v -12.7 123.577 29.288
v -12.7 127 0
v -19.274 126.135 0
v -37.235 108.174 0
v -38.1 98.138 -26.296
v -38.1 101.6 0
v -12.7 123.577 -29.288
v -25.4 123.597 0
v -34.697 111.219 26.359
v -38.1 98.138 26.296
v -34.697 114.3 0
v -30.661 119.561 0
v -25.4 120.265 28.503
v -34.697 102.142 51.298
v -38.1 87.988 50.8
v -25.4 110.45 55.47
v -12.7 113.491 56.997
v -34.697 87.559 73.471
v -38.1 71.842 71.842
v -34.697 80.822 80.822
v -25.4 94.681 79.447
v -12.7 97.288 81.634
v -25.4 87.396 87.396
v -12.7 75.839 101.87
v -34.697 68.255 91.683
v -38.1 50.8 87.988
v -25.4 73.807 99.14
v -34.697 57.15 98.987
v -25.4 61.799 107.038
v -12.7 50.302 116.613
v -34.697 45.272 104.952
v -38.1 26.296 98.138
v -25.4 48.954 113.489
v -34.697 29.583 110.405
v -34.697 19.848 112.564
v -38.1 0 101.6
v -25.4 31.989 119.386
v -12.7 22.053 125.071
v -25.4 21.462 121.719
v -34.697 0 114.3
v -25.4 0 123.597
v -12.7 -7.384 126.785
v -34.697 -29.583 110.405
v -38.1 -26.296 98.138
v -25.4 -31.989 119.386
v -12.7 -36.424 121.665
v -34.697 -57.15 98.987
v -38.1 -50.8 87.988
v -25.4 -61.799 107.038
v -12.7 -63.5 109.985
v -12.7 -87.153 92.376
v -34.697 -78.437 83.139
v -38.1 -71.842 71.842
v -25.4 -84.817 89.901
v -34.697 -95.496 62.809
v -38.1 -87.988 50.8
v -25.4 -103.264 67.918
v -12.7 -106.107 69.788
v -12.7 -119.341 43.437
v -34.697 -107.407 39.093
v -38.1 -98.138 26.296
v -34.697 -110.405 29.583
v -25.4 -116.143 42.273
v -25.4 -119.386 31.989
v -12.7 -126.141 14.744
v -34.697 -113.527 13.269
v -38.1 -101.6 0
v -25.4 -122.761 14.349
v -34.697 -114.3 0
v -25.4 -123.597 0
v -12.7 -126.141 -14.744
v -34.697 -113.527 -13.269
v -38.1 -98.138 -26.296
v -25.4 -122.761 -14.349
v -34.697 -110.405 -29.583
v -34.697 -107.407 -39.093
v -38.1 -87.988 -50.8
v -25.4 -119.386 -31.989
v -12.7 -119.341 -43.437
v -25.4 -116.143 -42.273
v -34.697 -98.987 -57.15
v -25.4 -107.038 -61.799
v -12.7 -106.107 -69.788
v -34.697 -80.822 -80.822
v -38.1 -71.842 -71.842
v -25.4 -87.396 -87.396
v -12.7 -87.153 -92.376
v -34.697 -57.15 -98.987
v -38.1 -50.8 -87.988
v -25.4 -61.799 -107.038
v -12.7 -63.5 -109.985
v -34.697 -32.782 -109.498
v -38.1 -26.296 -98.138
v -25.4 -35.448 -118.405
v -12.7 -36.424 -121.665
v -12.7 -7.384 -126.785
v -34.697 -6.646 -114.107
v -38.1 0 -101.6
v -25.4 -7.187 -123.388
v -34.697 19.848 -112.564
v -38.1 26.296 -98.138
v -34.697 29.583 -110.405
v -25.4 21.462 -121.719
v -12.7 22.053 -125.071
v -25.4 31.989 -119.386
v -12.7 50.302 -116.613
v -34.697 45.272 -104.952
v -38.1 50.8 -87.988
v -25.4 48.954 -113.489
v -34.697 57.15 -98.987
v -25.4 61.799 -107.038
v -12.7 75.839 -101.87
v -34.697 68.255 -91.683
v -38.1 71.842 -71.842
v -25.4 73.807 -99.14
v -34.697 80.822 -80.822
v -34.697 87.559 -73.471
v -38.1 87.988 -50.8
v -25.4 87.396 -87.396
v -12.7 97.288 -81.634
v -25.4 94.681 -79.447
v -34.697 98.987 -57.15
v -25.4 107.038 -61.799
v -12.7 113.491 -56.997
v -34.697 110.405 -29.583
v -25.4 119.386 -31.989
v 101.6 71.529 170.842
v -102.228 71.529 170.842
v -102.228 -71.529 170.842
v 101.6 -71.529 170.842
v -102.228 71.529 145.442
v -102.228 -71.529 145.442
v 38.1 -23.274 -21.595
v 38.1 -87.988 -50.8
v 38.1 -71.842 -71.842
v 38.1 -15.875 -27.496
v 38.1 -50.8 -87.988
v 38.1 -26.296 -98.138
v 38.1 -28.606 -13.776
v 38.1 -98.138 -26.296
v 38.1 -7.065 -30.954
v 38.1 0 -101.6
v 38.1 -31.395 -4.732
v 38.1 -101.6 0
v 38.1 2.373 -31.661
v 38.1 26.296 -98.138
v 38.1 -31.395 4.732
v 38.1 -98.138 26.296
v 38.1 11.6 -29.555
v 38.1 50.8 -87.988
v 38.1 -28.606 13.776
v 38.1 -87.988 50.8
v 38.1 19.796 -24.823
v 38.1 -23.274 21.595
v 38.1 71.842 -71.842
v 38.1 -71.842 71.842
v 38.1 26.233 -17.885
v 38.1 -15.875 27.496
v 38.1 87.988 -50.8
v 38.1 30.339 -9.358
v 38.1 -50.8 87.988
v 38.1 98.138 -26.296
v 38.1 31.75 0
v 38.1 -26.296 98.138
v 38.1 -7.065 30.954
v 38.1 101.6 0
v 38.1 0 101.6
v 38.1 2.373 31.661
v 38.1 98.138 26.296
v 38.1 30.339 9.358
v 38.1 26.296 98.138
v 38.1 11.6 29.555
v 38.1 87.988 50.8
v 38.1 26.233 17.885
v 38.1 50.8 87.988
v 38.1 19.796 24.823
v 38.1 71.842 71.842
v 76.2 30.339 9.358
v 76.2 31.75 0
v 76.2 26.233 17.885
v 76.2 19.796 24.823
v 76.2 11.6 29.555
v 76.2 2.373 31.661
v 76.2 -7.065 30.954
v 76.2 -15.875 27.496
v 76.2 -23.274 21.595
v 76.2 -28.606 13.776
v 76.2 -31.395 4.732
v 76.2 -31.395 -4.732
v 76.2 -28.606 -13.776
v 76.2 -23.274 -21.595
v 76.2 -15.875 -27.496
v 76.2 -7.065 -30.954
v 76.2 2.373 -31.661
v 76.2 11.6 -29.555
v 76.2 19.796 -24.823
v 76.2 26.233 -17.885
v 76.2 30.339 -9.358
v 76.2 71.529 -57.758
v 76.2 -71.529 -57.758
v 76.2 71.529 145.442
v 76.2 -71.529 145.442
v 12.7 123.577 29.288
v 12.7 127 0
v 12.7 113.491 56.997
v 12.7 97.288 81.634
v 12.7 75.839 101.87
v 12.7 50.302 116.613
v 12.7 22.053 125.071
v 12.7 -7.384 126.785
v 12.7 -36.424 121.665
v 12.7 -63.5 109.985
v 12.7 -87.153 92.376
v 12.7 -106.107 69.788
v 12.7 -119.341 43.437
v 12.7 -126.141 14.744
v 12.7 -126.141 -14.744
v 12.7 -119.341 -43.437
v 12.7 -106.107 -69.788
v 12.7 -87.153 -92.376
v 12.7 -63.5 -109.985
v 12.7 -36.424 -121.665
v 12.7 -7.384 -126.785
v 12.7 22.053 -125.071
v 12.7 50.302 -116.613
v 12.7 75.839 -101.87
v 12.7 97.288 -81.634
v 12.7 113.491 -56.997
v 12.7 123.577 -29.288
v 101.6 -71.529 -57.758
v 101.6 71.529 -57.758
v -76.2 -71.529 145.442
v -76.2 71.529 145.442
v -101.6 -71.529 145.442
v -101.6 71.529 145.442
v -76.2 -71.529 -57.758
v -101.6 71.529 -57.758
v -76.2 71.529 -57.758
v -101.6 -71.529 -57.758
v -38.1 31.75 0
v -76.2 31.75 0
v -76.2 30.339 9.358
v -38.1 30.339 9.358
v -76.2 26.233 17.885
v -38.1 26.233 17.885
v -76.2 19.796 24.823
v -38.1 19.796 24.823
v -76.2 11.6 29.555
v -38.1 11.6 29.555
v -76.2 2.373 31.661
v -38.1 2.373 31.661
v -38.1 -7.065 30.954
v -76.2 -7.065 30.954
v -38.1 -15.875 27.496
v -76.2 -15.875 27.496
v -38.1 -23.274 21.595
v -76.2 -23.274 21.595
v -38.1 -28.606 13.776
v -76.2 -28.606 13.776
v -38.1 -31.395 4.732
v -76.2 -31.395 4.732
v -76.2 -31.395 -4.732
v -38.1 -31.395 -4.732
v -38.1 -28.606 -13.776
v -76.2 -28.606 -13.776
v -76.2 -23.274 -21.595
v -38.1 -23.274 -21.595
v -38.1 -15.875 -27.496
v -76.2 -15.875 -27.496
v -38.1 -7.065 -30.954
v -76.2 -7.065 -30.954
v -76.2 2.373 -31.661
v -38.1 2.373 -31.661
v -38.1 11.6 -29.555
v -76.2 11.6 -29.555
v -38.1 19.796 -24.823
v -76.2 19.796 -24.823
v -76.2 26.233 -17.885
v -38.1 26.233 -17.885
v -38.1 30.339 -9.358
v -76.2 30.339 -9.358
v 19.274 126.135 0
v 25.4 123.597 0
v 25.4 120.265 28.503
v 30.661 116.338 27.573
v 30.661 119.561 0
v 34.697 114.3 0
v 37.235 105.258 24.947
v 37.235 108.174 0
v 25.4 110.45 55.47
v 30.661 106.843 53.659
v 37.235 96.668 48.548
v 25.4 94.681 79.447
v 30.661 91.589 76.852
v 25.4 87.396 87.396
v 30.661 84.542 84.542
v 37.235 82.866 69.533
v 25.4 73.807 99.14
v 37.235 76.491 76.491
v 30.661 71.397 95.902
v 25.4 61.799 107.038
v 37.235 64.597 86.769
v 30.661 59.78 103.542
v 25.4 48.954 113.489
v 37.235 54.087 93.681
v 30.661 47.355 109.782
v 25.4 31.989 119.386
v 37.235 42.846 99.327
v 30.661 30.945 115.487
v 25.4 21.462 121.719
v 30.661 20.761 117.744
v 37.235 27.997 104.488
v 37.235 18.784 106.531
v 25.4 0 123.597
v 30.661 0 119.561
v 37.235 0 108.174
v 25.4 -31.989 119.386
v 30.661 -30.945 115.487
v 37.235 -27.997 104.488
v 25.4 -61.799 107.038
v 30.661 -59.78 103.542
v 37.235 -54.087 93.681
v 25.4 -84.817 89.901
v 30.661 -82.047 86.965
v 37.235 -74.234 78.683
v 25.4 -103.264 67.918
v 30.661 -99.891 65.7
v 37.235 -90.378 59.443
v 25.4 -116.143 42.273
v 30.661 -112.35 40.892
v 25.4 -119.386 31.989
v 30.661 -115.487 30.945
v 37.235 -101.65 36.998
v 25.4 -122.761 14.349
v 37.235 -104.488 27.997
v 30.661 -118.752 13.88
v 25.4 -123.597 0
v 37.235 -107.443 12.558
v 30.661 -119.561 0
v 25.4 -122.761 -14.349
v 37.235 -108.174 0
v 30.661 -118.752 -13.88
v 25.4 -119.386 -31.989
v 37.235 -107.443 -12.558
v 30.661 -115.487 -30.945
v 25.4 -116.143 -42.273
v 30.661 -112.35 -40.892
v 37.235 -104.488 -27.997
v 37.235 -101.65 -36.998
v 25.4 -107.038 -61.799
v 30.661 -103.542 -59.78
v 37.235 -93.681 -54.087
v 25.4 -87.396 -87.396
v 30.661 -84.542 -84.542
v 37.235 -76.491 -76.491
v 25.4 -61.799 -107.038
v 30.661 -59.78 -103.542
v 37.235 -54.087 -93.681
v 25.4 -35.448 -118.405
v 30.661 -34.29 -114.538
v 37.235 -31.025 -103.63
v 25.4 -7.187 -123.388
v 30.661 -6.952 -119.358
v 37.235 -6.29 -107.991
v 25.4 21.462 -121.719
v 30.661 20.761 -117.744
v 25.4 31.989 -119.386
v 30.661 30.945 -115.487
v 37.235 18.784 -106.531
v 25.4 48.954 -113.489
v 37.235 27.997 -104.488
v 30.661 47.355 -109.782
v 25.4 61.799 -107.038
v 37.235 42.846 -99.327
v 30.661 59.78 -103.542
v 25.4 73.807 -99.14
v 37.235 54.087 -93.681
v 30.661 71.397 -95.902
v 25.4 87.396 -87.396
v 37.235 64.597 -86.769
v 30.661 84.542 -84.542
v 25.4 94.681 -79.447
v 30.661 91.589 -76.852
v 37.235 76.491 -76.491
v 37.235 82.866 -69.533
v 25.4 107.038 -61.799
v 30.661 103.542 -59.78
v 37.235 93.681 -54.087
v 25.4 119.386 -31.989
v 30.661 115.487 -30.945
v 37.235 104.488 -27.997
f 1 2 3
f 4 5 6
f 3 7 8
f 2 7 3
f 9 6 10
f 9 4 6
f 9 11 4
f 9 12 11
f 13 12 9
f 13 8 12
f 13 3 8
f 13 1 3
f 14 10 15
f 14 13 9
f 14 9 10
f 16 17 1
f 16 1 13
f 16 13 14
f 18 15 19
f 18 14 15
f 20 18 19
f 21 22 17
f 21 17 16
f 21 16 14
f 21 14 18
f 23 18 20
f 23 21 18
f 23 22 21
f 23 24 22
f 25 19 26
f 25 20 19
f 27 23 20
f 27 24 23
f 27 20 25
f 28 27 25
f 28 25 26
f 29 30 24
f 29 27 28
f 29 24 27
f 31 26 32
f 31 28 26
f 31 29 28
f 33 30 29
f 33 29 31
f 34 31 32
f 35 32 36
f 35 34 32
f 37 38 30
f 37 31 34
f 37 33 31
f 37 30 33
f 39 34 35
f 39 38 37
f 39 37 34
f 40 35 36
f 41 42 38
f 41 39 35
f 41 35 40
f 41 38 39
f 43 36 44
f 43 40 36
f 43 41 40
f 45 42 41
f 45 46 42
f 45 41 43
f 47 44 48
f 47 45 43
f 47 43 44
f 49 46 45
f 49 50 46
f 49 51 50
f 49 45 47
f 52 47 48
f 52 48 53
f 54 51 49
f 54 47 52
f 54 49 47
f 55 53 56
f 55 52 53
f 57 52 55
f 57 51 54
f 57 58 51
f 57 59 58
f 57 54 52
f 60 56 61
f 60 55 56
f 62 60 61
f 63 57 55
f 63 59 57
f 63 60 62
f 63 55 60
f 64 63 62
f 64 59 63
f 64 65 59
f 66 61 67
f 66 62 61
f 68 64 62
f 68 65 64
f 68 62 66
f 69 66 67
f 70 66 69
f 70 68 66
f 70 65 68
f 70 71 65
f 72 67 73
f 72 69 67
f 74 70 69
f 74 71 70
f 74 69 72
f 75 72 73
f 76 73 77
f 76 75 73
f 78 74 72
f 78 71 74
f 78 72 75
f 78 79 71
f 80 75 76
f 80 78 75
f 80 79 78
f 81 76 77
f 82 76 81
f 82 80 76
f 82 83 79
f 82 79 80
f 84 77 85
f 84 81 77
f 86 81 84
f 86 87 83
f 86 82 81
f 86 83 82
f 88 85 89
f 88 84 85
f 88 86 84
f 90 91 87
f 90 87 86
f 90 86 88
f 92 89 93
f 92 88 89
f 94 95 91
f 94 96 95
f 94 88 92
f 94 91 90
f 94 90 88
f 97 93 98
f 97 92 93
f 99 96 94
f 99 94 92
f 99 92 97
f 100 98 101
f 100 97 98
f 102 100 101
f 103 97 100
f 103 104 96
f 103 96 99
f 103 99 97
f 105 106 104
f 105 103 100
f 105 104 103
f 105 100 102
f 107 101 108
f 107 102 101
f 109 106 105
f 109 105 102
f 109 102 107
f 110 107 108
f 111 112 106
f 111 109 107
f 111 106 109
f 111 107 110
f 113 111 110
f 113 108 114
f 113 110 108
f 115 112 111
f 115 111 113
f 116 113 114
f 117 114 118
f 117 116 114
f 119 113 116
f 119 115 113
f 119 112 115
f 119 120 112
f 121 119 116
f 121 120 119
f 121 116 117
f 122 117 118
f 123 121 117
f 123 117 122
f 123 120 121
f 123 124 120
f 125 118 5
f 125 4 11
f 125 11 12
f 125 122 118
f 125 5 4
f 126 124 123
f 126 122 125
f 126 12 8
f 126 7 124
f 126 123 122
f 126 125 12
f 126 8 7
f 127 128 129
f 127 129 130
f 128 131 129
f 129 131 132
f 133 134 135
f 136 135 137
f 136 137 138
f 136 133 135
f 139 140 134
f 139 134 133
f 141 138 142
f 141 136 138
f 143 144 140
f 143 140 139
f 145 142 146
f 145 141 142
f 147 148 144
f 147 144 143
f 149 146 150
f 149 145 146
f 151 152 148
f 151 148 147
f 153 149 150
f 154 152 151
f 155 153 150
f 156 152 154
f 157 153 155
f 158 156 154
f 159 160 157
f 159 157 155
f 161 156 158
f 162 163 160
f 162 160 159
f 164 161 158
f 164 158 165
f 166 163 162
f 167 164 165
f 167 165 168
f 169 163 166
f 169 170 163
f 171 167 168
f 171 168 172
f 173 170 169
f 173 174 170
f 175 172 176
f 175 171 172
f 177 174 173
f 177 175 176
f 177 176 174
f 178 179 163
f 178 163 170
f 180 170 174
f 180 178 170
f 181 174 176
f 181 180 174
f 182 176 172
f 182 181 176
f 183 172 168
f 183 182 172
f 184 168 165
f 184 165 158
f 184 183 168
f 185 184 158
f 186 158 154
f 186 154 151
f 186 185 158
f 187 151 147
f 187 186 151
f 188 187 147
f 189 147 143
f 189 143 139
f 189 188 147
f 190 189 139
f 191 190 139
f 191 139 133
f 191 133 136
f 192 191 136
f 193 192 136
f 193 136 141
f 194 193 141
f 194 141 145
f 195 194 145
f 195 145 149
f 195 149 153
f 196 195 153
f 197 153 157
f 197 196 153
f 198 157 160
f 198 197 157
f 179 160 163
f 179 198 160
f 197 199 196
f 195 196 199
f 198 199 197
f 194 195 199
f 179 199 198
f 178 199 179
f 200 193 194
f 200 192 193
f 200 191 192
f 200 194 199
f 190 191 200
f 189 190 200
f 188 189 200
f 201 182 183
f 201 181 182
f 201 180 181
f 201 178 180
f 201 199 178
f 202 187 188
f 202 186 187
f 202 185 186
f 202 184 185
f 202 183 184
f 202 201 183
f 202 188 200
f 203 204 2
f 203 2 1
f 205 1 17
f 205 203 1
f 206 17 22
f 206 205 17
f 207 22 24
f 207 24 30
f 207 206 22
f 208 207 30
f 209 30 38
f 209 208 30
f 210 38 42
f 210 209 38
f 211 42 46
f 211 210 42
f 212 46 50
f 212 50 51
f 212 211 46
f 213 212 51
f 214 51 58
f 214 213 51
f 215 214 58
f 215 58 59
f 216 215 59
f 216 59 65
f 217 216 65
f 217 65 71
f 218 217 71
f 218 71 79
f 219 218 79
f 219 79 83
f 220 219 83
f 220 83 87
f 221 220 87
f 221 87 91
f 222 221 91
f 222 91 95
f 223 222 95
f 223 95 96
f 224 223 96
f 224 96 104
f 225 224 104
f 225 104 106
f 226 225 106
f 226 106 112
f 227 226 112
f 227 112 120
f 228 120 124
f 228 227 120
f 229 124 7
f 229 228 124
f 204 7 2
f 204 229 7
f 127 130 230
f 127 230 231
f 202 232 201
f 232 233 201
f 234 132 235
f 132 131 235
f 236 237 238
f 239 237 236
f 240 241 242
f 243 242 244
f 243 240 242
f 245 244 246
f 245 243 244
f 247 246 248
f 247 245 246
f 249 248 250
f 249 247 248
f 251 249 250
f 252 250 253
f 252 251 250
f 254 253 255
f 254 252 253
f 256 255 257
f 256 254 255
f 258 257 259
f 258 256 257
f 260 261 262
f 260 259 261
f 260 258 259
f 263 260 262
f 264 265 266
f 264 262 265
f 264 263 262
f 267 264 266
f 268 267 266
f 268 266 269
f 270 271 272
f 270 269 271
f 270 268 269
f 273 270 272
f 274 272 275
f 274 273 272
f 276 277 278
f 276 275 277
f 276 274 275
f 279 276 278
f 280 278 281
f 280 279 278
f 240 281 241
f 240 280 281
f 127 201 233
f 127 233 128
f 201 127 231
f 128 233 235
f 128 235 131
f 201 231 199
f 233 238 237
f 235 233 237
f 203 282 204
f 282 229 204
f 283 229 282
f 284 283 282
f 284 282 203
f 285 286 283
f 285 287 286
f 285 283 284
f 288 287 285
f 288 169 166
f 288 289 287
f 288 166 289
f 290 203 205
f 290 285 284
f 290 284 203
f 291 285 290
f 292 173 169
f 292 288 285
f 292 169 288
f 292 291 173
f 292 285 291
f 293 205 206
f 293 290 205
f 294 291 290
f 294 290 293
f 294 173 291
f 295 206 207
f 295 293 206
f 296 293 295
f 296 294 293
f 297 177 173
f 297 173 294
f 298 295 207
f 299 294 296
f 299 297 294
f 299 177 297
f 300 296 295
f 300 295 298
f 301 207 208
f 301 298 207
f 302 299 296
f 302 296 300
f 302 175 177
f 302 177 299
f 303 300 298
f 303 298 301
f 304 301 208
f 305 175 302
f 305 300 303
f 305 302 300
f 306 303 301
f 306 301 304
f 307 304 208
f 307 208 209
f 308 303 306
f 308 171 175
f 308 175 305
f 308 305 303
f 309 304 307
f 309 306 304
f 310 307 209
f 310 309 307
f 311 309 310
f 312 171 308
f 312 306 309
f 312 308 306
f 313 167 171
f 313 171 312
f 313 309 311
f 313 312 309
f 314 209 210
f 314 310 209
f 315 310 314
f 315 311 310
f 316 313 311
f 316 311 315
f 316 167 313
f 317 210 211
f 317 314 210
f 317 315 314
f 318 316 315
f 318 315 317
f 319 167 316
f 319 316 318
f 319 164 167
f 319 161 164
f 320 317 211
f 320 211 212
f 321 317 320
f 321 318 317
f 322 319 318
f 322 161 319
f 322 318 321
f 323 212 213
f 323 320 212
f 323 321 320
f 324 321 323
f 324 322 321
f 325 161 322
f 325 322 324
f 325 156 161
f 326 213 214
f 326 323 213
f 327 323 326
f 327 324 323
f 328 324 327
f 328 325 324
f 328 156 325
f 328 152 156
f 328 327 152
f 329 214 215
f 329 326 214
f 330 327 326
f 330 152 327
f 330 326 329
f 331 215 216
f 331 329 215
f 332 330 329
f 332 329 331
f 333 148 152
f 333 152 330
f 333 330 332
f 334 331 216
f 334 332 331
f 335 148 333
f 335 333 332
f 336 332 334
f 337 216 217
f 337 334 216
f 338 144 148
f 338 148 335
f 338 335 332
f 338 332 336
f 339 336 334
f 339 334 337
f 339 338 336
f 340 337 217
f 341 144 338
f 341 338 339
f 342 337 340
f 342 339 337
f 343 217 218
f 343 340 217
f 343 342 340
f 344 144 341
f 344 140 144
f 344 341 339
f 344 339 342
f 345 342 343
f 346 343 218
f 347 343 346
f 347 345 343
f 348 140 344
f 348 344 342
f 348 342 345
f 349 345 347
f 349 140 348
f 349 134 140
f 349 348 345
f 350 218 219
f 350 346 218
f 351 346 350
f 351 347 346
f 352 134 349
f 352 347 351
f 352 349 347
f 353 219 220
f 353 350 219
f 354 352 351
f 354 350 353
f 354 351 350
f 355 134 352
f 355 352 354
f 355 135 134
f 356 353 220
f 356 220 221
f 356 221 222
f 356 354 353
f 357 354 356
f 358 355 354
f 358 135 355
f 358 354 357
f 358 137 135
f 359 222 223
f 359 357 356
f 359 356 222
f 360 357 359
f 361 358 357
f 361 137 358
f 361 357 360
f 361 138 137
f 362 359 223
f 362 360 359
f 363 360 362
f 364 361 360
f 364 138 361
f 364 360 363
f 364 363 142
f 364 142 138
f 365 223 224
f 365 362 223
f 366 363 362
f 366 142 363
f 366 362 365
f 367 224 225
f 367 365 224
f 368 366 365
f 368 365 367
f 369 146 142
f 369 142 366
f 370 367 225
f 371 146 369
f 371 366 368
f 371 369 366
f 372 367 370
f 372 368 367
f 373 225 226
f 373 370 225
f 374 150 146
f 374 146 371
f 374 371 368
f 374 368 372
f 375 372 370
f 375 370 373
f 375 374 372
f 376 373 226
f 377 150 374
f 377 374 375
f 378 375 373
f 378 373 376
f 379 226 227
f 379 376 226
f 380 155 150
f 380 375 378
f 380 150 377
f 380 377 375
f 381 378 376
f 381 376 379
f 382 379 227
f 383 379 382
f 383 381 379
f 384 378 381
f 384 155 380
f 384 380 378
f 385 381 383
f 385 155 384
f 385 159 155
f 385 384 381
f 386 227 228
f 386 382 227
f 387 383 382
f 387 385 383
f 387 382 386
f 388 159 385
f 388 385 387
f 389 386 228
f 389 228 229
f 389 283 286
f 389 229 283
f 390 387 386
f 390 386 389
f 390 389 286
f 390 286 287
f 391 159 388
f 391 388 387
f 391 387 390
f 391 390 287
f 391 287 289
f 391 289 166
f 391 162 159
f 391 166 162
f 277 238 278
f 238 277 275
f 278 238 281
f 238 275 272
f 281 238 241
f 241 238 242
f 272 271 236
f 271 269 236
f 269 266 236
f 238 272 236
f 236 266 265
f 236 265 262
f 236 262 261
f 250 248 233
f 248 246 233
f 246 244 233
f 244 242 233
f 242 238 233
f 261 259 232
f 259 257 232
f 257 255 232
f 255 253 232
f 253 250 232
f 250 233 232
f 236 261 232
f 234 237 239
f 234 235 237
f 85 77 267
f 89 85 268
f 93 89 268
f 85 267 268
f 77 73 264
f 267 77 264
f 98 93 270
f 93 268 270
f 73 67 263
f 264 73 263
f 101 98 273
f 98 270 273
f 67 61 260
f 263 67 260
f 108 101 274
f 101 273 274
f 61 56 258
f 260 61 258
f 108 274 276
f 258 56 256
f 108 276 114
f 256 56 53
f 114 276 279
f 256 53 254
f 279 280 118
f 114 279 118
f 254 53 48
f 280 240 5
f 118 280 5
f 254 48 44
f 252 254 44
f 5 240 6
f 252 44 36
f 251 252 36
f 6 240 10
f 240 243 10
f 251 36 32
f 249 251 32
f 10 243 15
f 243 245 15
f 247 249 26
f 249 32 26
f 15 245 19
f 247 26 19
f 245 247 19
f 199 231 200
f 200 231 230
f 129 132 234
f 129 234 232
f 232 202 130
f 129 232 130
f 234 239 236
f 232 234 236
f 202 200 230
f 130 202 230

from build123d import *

# Parameters (mm, degrees)
F0_R      = 127
F1_DEPTH  = 38.1
F2_R      = 31.75
F3_DEPTH  = 101.6
F4_R      = 25.4
F5_D      = 76.2
F5_DEPTH  = 12.7
F5_TIP    = 22.892789585
F6_R      = 31.75
F7_DEPTH  = 25.4
F10_DEPTH = 25.4


with BuildPart() as f1:
    # F0 (on Right) → F1 (new body, symmetric)
    with BuildSketch(Plane.YZ):
        Circle(F0_R)
    extrude(amount=F1_DEPTH, both=True)

    # F2 (on Right) → F3 (join, symmetric)
    with BuildSketch(Plane.YZ):
        Circle(F2_R)
    extrude(amount=F3_DEPTH, both=True)

    # F4
    f4_edges = [f1.edges().sort_by_distance(p)[0] for p in [
        (38.1, -127, 0),
        (-38.1, -127, 0),
    ]]
    fillet(f4_edges, radius=F4_R)

    # F5 (one way)
    with BuildSketch(Plane.YZ):
        with Locations((-0.2433381014, -0.4866788513)):
            Circle(F5_D / 2)
    extrude(amount=-F5_DEPTH, mode=Mode.SUBTRACT)
    with Locations(Plane.YZ):
        with Locations((-0.2433381014, -0.4866788513)):
            with Locations((0, 0, -(F5_DEPTH + F5_TIP / 2))):  # 118° drill point
                Cone(0, F5_D / 2, F5_TIP, mode=Mode.SUBTRACT)

    # F6 (on face) → F7 (join)
    with BuildSketch(Plane(origin=(-101.6, 0, 0), x_dir=(0, -1, 0), z_dir=(-1, 0, 0))):
        Polygon((-71.5288005566, -57.7577332966), (0, -57.7577332966), (71.5288005566, -57.7577332966), (71.5288005566, 145.4422667034), (-71.5288005566, 145.4422667034), align=None)
        Circle(F6_R, mode=Mode.SUBTRACT)
    extrude(amount=-F7_DEPTH)

    # F8: F1 across plane


with BuildPart() as f1_1:
    add(f1.part)
    add(f1.part.mirror(Plane.YZ))

    # F9 (on face) → F10 (join)
    with BuildSketch(Plane.XY.offset(145.4422667034)):
        Polygon((101.6, -71.5288005566), (101.6, 71.5288005566), (76.2, 71.5288005566), (-102.2275537252, 71.5288005566), (-102.2275537252, -71.5288005566), (76.2, -71.5288005566), align=None)
    extrude(amount=F10_DEPTH)


solid = f1_1.part
